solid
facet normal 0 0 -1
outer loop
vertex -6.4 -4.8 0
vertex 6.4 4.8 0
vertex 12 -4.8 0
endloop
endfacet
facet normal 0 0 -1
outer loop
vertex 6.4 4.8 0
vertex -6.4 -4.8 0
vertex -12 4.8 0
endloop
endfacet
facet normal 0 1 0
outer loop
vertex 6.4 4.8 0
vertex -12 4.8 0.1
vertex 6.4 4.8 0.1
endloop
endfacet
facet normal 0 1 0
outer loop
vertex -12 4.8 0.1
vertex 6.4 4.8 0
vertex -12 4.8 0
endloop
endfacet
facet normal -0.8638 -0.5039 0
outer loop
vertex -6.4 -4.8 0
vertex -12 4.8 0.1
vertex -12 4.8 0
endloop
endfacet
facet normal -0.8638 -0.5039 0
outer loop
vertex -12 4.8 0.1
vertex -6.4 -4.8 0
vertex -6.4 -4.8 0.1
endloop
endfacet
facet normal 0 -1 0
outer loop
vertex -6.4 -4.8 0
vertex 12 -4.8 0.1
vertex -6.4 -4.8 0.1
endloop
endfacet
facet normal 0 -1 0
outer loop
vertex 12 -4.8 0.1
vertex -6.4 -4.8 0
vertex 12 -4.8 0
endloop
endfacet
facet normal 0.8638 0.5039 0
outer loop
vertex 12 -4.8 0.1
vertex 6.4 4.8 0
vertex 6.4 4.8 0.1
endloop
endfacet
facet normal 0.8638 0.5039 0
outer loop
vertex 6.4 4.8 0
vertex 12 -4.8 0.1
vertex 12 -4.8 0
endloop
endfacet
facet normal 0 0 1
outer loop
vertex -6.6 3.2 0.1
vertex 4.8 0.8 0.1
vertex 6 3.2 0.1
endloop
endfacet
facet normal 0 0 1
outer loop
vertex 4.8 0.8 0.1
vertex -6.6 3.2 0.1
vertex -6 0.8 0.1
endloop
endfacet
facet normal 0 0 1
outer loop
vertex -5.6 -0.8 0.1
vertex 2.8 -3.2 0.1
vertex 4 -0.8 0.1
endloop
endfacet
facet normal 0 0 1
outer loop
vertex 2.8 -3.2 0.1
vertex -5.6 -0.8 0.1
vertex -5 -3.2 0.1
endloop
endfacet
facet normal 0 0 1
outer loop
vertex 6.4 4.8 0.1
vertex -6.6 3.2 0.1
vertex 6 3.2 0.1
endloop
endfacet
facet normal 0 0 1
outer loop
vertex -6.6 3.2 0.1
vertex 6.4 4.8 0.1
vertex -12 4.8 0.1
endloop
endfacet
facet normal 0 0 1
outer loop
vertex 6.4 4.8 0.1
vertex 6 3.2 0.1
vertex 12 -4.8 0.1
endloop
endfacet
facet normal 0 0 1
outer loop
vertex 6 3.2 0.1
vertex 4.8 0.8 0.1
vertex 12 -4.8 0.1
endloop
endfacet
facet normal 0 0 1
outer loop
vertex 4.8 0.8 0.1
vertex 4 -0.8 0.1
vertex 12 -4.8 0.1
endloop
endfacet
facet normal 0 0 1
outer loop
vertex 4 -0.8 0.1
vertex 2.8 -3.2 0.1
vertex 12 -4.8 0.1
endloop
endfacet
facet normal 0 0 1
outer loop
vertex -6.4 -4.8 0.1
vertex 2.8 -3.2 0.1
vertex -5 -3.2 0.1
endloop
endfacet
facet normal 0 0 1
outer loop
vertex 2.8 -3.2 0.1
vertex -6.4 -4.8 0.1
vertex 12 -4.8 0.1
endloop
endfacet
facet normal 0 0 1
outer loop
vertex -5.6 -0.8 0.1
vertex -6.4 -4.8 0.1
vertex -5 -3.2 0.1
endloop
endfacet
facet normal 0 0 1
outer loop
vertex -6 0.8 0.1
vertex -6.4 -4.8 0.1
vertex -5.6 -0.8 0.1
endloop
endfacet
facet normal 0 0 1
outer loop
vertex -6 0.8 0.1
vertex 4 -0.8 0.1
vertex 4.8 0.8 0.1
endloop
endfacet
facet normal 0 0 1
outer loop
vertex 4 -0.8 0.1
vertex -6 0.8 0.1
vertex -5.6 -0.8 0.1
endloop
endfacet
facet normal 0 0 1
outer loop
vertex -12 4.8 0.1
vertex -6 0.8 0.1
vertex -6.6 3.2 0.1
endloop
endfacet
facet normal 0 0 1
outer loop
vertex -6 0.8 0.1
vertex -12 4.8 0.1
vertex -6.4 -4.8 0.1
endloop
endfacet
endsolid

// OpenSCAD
use <../lib.scad>
function ldraw_lib__820673i() = [
// 0 Sticker  1.2 x  3 Left Parallelogram with Two White Lines
// 0 Name: 820673i.dat
// 0 Author: Takeshi Takahashi [RainbowDolphin]
// 0 !LDRAW_ORG Part UPDATE 2022-05
// 0 !LICENSE Licensed under CC BY 4.0 : see CAreadme.txt
// 
// 0 BFC CERTIFY CCW
  [0,"BFC","CERTIFY"],
  [0,"BFC","CCW"],
// 
// 0 !KEYWORDS harbour, Seaport, Set 6542, ship
// 
// 0 !HISTORY 2022-09-15 [PTadmin] Official Update 2022-05
// 
// 
// 0 // Sticker box
// 4 16 16 0 12 30 0 -12 -16 0 -12 -30 0 12
  [4,16,16,0,12,30,0,-12,-16,0,-12,-30,0,12],
// 4 16 -30 -.25 12 16 -.25 12 16 0 12 -30 0 12
  [4,16,-30,-.25,12,16,-.25,12,16,0,12,-30,0,12],
// 4 16 -16 -.25 -12 -30 -.25 12 -30 0 12 -16 0 -12
  [4,16,-16,-.25,-12,-30,-.25,12,-30,0,12,-16,0,-12],
// 4 16 30 -.25 -12 -16 -.25 -12 -16 0 -12 30 0 -12
  [4,16,30,-.25,-12,-16,-.25,-12,-16,0,-12,30,0,-12],
// 4 16 16 -.25 12 30 -.25 -12 30 0 -12 16 0 12
  [4,16,16,-.25,12,30,-.25,-12,30,0,-12,16,0,12],
// 0 BFC NOCLIP
  [0,"BFC","NOCLIP"],
// 4 15 15 -.25 8 -16.5 -.25 8 -15 -.25 2 12 -.25 2
  [4,15,15,-.25,8,-16.5,-.25,8,-15,-.25,2,12,-.25,2],
// 4 15 10 -.25 -2 -14 -.25 -2 -12.5 -.25 -8 7 -.25 -8
  [4,15,10,-.25,-2,-14,-.25,-2,-12.5,-.25,-8,7,-.25,-8],
// 0 BFC CLIP
  [0,"BFC","CLIP"],
// 4 16 16 -.25 12 -30 -.25 12 -16.5 -.25 8 15 -.25 8
  [4,16,16,-.25,12,-30,-.25,12,-16.5,-.25,8,15,-.25,8],
// 3 16 16 -.25 12 15 -.25 8 30 -.25 -12
  [3,16,16,-.25,12,15,-.25,8,30,-.25,-12],
// 3 16 15 -.25 8 12 -.25 2 30 -.25 -12
  [3,16,15,-.25,8,12,-.25,2,30,-.25,-12],
// 3 16 12 -.25 2 10 -.25 -2 30 -.25 -12
  [3,16,12,-.25,2,10,-.25,-2,30,-.25,-12],
// 3 16 10 -.25 -2 7 -.25 -8 30 -.25 -12
  [3,16,10,-.25,-2,7,-.25,-8,30,-.25,-12],
// 4 16 -16 -.25 -12 30 -.25 -12 7 -.25 -8 -12.5 -.25 -8
  [4,16,-16,-.25,-12,30,-.25,-12,7,-.25,-8,-12.5,-.25,-8],
// 3 16 -14 -.25 -2 -16 -.25 -12 -12.5 -.25 -8
  [3,16,-14,-.25,-2,-16,-.25,-12,-12.5,-.25,-8],
// 3 16 -15 -.25 2 -16 -.25 -12 -14 -.25 -2
  [3,16,-15,-.25,2,-16,-.25,-12,-14,-.25,-2],
// 4 16 12 -.25 2 -15 -.25 2 -14 -.25 -2 10 -.25 -2
  [4,16,12,-.25,2,-15,-.25,2,-14,-.25,-2,10,-.25,-2],
// 4 16 -16 -.25 -12 -15 -.25 2 -16.5 -.25 8 -30 -.25 12
  [4,16,-16,-.25,-12,-15,-.25,2,-16.5,-.25,8,-30,-.25,12],
];
module ldraw_lib__820673i(step=0, col=false, unit=2/5, alt=false, line=0.2, solid=!$preview)
    makepoly(ldraw_lib__820673i(), step=step, col=col, unit=unit, alt=alt, line=line, solid=solid);
ldraw_lib__820673i(line=0.2);
